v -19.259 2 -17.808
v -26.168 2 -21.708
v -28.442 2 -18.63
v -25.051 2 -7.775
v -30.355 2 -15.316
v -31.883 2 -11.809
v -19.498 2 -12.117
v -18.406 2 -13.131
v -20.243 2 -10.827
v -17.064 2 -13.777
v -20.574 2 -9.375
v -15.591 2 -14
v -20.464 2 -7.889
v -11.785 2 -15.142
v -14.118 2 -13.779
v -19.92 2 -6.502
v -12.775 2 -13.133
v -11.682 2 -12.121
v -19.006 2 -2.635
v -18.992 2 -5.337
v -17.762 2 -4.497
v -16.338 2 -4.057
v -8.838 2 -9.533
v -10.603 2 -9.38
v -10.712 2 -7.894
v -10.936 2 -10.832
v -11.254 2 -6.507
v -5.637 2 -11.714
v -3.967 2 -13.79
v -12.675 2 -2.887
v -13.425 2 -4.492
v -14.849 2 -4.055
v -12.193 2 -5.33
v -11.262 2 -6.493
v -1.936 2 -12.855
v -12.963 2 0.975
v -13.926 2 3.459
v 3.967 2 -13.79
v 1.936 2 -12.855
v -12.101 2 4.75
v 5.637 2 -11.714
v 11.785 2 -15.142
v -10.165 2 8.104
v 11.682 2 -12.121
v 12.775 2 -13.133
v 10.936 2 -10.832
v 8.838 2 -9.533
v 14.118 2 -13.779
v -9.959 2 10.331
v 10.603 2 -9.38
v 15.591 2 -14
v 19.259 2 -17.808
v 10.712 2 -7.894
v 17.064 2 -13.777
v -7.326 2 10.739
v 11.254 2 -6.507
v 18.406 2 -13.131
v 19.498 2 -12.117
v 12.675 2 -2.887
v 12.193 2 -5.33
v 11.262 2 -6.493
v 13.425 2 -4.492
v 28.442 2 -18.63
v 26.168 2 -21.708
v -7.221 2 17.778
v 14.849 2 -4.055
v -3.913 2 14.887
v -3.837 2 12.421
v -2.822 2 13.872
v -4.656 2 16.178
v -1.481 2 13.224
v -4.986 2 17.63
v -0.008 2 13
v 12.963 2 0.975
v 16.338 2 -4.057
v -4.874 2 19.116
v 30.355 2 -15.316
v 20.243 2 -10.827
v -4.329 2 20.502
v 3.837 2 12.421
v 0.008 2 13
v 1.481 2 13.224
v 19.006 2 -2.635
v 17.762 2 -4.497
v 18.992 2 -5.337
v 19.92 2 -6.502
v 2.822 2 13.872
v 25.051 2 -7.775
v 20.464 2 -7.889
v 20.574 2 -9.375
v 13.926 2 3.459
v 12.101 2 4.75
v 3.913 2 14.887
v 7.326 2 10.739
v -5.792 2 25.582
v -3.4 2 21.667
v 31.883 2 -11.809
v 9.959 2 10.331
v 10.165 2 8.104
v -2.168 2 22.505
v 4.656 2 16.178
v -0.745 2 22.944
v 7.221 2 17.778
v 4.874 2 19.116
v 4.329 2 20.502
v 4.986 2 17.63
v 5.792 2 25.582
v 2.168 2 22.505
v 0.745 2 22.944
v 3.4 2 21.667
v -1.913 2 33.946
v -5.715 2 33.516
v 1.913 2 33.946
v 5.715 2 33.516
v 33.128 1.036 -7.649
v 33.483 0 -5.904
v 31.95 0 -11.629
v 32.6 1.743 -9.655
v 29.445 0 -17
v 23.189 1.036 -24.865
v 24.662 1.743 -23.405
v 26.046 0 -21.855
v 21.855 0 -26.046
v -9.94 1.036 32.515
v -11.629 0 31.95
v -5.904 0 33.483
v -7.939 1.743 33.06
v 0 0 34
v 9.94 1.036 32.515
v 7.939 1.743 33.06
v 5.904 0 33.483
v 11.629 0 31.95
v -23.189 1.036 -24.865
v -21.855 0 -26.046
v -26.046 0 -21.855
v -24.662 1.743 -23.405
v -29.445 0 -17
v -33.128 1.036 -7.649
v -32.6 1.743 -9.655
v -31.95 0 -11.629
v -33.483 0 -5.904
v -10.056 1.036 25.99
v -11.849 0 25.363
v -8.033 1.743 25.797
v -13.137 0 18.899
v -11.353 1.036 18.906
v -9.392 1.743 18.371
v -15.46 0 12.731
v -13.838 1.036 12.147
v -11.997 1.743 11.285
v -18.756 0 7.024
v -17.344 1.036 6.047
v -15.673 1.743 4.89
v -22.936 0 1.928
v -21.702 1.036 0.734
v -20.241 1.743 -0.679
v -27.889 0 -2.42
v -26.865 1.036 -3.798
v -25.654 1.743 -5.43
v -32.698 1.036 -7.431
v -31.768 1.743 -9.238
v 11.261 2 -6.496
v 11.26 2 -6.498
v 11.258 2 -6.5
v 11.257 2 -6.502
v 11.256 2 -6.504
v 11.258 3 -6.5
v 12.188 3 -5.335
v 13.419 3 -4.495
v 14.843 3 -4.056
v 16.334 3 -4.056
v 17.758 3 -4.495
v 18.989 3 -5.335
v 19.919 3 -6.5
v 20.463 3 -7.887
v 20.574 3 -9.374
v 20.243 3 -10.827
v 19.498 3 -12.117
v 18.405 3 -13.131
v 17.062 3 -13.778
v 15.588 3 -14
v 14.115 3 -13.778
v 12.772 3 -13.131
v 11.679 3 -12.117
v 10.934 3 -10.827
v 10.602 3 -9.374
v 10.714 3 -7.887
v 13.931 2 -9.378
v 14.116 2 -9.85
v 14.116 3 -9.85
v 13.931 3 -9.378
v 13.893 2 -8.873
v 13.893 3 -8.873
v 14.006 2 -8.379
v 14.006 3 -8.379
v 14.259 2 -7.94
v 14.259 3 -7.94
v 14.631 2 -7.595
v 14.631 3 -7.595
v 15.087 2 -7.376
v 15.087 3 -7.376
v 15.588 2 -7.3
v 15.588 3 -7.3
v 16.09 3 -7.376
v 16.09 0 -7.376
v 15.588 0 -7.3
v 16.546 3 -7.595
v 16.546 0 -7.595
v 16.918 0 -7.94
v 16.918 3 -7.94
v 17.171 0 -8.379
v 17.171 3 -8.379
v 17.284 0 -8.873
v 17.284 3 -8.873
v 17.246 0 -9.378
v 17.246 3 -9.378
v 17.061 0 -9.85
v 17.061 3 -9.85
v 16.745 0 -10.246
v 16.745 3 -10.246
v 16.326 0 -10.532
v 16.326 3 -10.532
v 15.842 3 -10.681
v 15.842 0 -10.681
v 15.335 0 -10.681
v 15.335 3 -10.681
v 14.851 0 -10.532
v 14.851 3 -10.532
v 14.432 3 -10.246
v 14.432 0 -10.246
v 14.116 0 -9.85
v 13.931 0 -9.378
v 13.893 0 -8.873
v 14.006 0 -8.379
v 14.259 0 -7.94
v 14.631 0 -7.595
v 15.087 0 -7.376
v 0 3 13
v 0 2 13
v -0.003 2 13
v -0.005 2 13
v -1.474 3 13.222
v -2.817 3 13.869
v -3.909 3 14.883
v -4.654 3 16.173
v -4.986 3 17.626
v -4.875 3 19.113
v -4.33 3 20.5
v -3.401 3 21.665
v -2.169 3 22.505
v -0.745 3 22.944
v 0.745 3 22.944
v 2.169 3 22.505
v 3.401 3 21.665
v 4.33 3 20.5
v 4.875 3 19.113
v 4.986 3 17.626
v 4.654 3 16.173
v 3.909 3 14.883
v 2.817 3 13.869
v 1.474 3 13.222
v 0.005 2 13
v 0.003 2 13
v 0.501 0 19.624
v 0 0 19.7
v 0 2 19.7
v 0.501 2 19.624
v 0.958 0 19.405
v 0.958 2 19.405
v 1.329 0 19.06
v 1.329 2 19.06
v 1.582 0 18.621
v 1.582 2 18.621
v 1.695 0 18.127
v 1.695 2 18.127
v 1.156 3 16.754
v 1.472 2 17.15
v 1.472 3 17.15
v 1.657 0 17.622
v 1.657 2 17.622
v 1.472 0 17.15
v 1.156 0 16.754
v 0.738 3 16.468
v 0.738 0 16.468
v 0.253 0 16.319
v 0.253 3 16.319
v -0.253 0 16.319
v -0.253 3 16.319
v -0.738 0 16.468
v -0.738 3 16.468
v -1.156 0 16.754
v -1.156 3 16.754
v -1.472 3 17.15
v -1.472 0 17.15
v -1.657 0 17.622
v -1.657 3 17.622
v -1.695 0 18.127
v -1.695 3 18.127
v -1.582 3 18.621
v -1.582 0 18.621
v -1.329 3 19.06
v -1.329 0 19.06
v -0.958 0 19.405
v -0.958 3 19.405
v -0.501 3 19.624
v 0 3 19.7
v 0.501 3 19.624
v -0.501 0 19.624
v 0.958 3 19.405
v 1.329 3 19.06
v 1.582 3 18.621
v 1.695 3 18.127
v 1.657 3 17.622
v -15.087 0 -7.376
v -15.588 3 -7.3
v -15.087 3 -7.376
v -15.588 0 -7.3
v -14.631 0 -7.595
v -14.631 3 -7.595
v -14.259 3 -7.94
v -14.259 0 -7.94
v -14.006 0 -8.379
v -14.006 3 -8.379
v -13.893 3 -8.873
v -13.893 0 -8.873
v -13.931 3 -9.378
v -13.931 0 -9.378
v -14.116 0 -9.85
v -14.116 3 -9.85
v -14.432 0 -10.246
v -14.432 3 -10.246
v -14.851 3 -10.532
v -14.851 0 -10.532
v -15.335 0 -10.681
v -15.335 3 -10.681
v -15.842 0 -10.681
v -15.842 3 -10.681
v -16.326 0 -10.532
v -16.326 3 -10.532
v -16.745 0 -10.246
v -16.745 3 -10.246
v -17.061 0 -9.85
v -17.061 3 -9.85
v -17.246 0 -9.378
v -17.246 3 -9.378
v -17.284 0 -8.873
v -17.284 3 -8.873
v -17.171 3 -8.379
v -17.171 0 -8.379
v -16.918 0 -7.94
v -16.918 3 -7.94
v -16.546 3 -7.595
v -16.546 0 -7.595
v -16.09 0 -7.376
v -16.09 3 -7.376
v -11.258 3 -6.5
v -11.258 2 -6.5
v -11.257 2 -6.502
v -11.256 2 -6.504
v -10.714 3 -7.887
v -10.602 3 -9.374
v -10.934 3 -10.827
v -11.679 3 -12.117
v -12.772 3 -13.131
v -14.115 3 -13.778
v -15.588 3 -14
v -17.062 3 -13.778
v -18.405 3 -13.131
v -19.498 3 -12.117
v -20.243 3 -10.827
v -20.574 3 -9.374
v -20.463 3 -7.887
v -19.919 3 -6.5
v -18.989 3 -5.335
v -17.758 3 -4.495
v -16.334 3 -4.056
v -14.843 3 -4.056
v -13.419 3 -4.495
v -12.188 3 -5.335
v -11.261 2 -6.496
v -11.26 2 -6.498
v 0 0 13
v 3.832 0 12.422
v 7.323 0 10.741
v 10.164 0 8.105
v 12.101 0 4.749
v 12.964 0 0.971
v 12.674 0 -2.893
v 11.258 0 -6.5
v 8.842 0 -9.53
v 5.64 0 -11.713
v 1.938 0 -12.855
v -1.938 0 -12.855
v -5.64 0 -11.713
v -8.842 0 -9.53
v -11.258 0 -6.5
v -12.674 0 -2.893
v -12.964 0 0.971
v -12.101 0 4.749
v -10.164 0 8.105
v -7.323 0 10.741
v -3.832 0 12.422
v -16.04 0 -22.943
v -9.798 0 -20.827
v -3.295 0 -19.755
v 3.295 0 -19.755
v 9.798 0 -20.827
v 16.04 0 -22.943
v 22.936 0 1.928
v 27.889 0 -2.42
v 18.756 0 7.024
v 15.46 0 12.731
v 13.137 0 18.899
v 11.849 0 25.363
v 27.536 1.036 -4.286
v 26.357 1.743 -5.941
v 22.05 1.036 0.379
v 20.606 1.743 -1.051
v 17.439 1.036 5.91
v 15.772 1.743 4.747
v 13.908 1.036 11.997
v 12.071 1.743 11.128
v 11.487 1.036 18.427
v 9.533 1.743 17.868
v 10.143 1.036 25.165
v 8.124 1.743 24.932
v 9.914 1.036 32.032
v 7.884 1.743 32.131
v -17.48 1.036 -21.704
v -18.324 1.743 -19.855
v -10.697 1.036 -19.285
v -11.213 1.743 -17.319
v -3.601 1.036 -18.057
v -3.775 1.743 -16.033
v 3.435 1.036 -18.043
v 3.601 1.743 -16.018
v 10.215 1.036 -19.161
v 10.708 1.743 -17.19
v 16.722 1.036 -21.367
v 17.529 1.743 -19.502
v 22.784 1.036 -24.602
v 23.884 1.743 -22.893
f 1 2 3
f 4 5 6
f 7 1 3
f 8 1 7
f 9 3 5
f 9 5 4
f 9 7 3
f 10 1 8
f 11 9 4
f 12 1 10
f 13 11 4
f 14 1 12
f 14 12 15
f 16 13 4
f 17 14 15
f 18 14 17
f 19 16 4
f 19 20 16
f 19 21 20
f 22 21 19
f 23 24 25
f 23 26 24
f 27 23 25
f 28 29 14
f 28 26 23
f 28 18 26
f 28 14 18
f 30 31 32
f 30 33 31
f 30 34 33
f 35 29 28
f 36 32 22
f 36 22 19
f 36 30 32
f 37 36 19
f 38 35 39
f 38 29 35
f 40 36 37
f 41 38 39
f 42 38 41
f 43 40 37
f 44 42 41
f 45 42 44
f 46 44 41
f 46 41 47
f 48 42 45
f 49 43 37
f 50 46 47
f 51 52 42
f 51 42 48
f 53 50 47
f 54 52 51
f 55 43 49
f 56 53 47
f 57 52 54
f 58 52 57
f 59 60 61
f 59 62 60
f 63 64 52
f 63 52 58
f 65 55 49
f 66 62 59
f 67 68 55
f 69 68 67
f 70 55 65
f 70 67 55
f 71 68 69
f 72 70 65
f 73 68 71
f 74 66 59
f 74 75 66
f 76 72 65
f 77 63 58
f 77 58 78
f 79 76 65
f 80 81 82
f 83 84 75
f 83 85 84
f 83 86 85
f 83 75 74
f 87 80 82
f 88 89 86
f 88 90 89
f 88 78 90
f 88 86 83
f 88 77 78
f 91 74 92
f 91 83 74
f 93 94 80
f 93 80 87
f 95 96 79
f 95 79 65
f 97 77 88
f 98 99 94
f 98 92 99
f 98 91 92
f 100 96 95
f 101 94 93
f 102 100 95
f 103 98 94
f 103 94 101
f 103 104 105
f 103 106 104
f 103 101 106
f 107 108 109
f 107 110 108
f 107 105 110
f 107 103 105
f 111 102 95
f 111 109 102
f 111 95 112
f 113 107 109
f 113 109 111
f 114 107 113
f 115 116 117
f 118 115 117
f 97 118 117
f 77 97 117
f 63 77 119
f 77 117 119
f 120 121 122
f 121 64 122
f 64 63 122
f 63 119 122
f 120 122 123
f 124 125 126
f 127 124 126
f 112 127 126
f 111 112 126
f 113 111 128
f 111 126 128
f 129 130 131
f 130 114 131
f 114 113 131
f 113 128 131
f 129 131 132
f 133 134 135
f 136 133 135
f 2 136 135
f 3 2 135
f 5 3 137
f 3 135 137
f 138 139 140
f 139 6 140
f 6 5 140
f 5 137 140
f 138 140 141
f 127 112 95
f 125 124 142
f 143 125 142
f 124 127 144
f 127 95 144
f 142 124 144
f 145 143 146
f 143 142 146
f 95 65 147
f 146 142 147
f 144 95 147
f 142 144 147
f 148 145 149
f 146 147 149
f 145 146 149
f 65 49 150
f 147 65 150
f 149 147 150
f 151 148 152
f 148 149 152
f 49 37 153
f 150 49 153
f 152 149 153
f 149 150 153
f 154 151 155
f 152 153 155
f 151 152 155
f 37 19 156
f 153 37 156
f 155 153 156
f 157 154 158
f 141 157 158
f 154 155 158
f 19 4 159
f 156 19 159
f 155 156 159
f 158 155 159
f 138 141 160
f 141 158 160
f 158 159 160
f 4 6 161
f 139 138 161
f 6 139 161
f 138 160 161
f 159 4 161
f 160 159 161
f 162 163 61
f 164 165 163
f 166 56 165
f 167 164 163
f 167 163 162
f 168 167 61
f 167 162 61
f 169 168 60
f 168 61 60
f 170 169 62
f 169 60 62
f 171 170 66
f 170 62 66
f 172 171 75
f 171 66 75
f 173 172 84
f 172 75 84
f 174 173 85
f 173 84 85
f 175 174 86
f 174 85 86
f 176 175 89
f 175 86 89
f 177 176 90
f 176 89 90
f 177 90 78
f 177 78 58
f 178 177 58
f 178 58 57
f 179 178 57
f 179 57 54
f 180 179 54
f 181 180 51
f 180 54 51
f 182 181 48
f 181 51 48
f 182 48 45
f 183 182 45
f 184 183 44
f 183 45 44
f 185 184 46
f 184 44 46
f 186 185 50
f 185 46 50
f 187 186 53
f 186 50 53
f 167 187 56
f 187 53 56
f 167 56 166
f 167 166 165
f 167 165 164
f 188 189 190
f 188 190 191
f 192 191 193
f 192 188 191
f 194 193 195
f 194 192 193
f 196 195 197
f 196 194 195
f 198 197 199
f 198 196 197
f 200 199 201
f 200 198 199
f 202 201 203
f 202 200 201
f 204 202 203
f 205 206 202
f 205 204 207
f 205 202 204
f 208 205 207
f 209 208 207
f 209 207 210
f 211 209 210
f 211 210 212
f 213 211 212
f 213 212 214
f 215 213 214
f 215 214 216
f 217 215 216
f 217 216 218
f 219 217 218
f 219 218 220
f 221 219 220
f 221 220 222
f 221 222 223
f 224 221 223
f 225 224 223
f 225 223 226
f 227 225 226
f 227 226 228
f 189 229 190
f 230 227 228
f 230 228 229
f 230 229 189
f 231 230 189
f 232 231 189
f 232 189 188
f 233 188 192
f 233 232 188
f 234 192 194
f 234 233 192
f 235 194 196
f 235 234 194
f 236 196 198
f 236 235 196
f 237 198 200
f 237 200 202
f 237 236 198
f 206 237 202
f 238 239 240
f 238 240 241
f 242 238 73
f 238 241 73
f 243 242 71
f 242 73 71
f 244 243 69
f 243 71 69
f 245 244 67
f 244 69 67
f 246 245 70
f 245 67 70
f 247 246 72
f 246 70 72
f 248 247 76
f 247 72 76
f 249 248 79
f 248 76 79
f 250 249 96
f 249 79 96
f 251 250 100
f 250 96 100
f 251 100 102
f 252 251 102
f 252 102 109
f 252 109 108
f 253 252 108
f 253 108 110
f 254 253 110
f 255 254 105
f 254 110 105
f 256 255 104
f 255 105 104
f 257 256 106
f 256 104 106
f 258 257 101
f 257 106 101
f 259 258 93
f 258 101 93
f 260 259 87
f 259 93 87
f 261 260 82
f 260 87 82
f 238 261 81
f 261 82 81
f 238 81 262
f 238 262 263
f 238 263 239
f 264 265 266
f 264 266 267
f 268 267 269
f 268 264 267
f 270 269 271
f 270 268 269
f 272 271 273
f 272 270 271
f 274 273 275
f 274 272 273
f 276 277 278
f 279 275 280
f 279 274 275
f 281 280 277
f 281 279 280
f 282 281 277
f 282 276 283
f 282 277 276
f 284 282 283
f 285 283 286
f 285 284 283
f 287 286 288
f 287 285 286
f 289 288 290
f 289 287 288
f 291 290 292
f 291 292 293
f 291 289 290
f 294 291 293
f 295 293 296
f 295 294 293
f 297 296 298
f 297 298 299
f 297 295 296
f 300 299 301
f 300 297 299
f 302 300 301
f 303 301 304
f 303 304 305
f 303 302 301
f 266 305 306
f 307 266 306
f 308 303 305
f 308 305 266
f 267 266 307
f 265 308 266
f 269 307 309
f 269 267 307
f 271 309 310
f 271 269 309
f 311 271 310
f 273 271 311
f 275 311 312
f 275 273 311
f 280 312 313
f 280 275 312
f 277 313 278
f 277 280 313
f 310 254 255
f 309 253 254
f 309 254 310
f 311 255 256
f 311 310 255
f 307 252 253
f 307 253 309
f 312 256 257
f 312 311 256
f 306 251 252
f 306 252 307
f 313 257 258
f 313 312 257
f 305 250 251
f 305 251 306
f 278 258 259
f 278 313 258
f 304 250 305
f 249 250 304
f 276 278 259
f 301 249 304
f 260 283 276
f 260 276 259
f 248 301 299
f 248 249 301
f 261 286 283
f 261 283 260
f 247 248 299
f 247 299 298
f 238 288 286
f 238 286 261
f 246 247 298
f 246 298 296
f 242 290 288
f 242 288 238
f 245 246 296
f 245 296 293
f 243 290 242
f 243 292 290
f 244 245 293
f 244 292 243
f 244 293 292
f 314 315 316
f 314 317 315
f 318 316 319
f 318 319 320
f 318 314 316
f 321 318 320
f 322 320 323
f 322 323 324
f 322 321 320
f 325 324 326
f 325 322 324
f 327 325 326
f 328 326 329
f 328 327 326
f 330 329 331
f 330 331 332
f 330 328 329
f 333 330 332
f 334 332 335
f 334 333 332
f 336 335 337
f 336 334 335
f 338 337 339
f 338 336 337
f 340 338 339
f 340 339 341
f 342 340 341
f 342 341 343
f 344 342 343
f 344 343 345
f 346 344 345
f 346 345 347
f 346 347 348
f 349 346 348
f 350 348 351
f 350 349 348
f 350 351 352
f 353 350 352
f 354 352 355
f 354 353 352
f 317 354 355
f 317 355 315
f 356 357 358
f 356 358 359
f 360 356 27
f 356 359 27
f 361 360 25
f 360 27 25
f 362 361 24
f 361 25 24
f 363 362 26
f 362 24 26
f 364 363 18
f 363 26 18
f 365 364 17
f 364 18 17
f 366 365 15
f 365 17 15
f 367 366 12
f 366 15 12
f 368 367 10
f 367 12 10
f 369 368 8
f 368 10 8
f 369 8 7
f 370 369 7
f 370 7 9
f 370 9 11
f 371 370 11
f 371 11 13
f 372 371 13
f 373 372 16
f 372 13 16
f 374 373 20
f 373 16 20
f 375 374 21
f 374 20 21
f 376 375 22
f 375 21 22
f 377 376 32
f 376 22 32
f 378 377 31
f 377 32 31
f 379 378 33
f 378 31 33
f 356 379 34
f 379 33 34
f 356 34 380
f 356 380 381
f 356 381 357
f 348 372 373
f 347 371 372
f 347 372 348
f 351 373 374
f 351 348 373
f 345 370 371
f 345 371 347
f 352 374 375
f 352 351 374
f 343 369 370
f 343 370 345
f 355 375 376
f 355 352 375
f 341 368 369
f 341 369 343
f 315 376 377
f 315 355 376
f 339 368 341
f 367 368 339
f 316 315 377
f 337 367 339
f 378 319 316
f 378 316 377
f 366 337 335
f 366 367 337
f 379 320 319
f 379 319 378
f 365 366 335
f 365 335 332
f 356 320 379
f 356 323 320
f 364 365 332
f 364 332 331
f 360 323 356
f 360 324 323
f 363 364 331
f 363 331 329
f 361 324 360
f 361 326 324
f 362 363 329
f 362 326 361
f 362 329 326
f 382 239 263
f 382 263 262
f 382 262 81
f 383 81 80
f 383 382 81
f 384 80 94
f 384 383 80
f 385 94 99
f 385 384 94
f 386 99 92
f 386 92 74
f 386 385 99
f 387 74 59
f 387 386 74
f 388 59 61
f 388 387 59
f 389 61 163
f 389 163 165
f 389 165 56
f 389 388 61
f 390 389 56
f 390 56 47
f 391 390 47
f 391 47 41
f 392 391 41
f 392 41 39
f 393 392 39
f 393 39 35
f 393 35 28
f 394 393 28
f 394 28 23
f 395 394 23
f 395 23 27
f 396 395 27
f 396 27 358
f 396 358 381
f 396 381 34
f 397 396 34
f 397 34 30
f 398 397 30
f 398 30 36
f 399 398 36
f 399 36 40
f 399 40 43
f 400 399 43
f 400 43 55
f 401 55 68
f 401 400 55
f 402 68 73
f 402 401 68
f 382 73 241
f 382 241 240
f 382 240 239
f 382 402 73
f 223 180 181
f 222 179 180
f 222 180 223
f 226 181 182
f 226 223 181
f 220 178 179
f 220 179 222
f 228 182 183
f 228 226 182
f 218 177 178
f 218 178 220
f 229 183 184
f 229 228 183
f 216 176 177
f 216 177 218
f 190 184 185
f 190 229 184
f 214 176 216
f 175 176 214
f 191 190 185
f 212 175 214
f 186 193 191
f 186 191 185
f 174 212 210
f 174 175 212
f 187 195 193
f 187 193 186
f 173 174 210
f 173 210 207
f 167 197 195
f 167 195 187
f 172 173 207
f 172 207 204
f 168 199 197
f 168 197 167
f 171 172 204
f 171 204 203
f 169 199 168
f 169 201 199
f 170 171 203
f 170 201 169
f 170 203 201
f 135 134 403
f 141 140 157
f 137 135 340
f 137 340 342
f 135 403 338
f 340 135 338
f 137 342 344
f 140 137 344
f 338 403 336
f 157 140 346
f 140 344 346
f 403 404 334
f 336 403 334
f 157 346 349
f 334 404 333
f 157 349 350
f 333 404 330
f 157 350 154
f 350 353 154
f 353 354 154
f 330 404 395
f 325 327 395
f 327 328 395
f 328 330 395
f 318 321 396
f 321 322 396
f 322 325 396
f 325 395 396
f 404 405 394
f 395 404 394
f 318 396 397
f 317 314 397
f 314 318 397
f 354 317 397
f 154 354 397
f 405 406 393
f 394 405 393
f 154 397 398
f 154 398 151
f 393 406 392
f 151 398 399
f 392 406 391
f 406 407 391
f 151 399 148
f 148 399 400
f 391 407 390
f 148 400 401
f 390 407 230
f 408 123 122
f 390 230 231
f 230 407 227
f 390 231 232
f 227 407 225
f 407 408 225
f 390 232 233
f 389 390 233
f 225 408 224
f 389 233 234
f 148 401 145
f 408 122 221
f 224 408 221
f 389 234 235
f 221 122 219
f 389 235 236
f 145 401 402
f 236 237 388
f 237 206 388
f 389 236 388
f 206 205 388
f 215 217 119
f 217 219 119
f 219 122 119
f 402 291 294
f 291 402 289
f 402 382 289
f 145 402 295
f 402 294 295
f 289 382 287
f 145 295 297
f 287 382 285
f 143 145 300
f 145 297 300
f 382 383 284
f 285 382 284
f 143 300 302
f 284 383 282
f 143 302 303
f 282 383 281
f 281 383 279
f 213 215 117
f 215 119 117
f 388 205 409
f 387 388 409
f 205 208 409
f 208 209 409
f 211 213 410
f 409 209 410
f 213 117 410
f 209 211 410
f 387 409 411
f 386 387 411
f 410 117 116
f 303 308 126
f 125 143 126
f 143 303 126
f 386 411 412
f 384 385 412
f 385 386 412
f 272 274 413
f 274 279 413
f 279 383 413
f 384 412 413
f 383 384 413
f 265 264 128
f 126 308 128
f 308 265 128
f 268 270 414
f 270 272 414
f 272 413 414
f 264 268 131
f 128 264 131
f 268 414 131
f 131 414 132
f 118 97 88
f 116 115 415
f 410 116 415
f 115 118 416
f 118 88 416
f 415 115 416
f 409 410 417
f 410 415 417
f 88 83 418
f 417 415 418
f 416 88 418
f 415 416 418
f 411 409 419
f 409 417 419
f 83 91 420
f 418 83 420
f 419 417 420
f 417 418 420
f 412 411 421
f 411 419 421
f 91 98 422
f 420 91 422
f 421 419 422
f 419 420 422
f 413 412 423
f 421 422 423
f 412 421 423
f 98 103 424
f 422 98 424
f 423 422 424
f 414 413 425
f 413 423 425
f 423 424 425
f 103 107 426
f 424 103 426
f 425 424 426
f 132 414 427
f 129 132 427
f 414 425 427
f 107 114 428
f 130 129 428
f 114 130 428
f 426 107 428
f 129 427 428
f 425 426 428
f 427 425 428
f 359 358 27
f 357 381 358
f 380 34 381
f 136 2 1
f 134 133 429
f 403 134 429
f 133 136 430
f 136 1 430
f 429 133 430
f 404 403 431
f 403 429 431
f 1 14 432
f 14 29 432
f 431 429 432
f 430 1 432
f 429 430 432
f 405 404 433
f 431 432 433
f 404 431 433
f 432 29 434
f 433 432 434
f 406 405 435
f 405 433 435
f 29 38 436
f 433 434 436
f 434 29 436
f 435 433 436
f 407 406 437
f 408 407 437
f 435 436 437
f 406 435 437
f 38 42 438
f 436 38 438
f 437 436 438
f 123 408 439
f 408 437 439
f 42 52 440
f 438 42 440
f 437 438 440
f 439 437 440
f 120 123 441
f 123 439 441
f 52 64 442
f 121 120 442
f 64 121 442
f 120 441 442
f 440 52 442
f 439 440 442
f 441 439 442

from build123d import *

# Parameters (mm, degrees)
SKETCH1_R           = 34
SKETCH1_R_2         = 1.6999999999999995
SKETCH1_R_3         = 1.7
SKETCH1_R_4         = 13
BOSS_EXTRUDE1_DEPTH = 2
SKETCH3_R           = 40.37992907465996
CUT_EXTRUDE1_DEPTH  = 2
SKETCH4_R           = 5.000000000000001
SKETCH4_R_2         = 1.6999999999999995
BOSS_EXTRUDE2_DEPTH = 1
CIRPATTERN1_COUNT   = 3
FILLET1_ANGLE       = 68.695952
FILLET1_2_ANGLE     = 68.695952
FILLET1_3_ANGLE     = 68.695952


with BuildPart() as part:
    # Sketch1 → Boss-Extrude1 (new body)
    with BuildSketch(Plane(origin=(0, 0, 0), x_dir=(1, 0, 0), z_dir=(0, 1, 0))):
        with Locations(Location((0, 0, 0), (0, 0, 270))):
            Circle(SKETCH1_R)
        with Locations(Location((15.58845, 8.99999580374902, 0), (0, 0, 270))):
            Circle(SKETCH1_R_2, mode=Mode.SUBTRACT)
        with Locations(Location((1.73e-15, -17.999991607498043, 0), (0, 0, 270))):
            Circle(SKETCH1_R_3, mode=Mode.SUBTRACT)
        with Locations(Location((-15.588449999999993, 8.999995803749012, 0), (0, 0, 270))):
            Circle(SKETCH1_R_2, mode=Mode.SUBTRACT)
        with Locations(Location((0, 0, 0), (0, 0, 270))):
            Circle(SKETCH1_R_4, mode=Mode.SUBTRACT)
    extrude(amount=BOSS_EXTRUDE1_DEPTH)

    # Sketch3 → Cut-Extrude1 (cut)
    with BuildSketch(Plane(origin=(0, 2, 0), x_dir=(1, 0, 0), z_dir=(0, 1, 0))):
        with Locations((51.96152422706632, -29.999999999999986)):
            Circle(SKETCH3_R)
    cut_extrude1 = extrude(amount=-CUT_EXTRUDE1_DEPTH, mode=Mode.SUBTRACT)

    # Sketch4 → Boss-Extrude2 (add)
    with BuildSketch(Plane(origin=(0, 2, 0), x_dir=(1, 0, 0), z_dir=(0, 1, 0))):
        with Locations(Location((-15.588449999999993, 8.999995803749012, 0), (0, 0, 330))):
            Circle(SKETCH4_R)
        with Locations(Location((-15.588449999999993, 8.999995803749012, 0), (0, 0, 270))):
            Circle(SKETCH4_R_2, mode=Mode.SUBTRACT)
    boss_extrude2 = extrude(amount=BOSS_EXTRUDE2_DEPTH)

    # CirPattern1: Cut-Extrude1, Boss-Extrude2 ×3 about axis
    cirpattern1_axis = Axis((-1.58e-15, 0, 2.4e-16), (0, 1, 0))
    add([cut_extrude1.rotate(cirpattern1_axis, i * 360 / CIRPATTERN1_COUNT) for i in range(1, CIRPATTERN1_COUNT)], mode=Mode.SUBTRACT)
    add([boss_extrude2.rotate(cirpattern1_axis, i * 360 / CIRPATTERN1_COUNT) for i in range(1, CIRPATTERN1_COUNT)])

    # Fillet1: read off the stored shape, not the designer's step
    # Fillet1 outline → Fillet1 (revolve, cut)
    with BuildSketch(Plane(origin=(0, 0, -60), x_dir=(-0.5642175786181923, 0, 0.8256261405613463), z_dir=(-0.8256261405613463, 0, -0.5642175786181923))):
        with BuildLine():
            ThreePointArc((40.379929075, 0), (43.217651415, 1.486832981), (46.379929075, 2))
            Line((46.379929075, 2), (40.379929075, 2))
            Line((40.379929075, 2), (40.379929075, 0))
        make_face()
    revolve(axis=Axis((0, 0, -60), (0, 1, 0)), revolution_arc=FILLET1_ANGLE, mode=Mode.SUBTRACT)

    # Fillet1 2 outline → Fillet1 2 (revolve, cut)
    with BuildSketch(Plane(origin=(-51.961524227, 0, 30), x_dir=(0.9971220010637243, 0, 0.07581368606441925), z_dir=(-0.07581368606441925, 0, 0.9971220010637243))):
        with BuildLine():
            ThreePointArc((40.379929075, 0), (43.217651415, 1.486832981), (46.379929075, 2))
            Line((46.379929075, 2), (40.379929075, 2))
            Line((40.379929075, 2), (40.379929075, 0))
        make_face()
    revolve(axis=Axis((-51.961524227, 0, 30), (0, 1.0000000000000002, 0)), revolution_arc=FILLET1_2_ANGLE, mode=Mode.SUBTRACT)

    # Fillet1 3 outline → Fillet1 3 (revolve, cut)
    with BuildSketch(Plane(origin=(51.961524227, 0, 30), x_dir=(-0.43290442244553945, 0, -0.9014398266257676), z_dir=(0.9014398266257676, 0, -0.43290442244553945))):
        with BuildLine():
            ThreePointArc((40.379929075, 0), (43.217651415, 1.486832981), (46.379929075, 2))
            Line((46.379929075, 2), (40.379929075, 2))
            Line((40.379929075, 2), (40.379929075, 0))
        make_face()
    revolve(axis=Axis((51.961524227, 0, 30), (0, 1, 0)), revolution_arc=FILLET1_3_ANGLE, mode=Mode.SUBTRACT)


solid = part.part
